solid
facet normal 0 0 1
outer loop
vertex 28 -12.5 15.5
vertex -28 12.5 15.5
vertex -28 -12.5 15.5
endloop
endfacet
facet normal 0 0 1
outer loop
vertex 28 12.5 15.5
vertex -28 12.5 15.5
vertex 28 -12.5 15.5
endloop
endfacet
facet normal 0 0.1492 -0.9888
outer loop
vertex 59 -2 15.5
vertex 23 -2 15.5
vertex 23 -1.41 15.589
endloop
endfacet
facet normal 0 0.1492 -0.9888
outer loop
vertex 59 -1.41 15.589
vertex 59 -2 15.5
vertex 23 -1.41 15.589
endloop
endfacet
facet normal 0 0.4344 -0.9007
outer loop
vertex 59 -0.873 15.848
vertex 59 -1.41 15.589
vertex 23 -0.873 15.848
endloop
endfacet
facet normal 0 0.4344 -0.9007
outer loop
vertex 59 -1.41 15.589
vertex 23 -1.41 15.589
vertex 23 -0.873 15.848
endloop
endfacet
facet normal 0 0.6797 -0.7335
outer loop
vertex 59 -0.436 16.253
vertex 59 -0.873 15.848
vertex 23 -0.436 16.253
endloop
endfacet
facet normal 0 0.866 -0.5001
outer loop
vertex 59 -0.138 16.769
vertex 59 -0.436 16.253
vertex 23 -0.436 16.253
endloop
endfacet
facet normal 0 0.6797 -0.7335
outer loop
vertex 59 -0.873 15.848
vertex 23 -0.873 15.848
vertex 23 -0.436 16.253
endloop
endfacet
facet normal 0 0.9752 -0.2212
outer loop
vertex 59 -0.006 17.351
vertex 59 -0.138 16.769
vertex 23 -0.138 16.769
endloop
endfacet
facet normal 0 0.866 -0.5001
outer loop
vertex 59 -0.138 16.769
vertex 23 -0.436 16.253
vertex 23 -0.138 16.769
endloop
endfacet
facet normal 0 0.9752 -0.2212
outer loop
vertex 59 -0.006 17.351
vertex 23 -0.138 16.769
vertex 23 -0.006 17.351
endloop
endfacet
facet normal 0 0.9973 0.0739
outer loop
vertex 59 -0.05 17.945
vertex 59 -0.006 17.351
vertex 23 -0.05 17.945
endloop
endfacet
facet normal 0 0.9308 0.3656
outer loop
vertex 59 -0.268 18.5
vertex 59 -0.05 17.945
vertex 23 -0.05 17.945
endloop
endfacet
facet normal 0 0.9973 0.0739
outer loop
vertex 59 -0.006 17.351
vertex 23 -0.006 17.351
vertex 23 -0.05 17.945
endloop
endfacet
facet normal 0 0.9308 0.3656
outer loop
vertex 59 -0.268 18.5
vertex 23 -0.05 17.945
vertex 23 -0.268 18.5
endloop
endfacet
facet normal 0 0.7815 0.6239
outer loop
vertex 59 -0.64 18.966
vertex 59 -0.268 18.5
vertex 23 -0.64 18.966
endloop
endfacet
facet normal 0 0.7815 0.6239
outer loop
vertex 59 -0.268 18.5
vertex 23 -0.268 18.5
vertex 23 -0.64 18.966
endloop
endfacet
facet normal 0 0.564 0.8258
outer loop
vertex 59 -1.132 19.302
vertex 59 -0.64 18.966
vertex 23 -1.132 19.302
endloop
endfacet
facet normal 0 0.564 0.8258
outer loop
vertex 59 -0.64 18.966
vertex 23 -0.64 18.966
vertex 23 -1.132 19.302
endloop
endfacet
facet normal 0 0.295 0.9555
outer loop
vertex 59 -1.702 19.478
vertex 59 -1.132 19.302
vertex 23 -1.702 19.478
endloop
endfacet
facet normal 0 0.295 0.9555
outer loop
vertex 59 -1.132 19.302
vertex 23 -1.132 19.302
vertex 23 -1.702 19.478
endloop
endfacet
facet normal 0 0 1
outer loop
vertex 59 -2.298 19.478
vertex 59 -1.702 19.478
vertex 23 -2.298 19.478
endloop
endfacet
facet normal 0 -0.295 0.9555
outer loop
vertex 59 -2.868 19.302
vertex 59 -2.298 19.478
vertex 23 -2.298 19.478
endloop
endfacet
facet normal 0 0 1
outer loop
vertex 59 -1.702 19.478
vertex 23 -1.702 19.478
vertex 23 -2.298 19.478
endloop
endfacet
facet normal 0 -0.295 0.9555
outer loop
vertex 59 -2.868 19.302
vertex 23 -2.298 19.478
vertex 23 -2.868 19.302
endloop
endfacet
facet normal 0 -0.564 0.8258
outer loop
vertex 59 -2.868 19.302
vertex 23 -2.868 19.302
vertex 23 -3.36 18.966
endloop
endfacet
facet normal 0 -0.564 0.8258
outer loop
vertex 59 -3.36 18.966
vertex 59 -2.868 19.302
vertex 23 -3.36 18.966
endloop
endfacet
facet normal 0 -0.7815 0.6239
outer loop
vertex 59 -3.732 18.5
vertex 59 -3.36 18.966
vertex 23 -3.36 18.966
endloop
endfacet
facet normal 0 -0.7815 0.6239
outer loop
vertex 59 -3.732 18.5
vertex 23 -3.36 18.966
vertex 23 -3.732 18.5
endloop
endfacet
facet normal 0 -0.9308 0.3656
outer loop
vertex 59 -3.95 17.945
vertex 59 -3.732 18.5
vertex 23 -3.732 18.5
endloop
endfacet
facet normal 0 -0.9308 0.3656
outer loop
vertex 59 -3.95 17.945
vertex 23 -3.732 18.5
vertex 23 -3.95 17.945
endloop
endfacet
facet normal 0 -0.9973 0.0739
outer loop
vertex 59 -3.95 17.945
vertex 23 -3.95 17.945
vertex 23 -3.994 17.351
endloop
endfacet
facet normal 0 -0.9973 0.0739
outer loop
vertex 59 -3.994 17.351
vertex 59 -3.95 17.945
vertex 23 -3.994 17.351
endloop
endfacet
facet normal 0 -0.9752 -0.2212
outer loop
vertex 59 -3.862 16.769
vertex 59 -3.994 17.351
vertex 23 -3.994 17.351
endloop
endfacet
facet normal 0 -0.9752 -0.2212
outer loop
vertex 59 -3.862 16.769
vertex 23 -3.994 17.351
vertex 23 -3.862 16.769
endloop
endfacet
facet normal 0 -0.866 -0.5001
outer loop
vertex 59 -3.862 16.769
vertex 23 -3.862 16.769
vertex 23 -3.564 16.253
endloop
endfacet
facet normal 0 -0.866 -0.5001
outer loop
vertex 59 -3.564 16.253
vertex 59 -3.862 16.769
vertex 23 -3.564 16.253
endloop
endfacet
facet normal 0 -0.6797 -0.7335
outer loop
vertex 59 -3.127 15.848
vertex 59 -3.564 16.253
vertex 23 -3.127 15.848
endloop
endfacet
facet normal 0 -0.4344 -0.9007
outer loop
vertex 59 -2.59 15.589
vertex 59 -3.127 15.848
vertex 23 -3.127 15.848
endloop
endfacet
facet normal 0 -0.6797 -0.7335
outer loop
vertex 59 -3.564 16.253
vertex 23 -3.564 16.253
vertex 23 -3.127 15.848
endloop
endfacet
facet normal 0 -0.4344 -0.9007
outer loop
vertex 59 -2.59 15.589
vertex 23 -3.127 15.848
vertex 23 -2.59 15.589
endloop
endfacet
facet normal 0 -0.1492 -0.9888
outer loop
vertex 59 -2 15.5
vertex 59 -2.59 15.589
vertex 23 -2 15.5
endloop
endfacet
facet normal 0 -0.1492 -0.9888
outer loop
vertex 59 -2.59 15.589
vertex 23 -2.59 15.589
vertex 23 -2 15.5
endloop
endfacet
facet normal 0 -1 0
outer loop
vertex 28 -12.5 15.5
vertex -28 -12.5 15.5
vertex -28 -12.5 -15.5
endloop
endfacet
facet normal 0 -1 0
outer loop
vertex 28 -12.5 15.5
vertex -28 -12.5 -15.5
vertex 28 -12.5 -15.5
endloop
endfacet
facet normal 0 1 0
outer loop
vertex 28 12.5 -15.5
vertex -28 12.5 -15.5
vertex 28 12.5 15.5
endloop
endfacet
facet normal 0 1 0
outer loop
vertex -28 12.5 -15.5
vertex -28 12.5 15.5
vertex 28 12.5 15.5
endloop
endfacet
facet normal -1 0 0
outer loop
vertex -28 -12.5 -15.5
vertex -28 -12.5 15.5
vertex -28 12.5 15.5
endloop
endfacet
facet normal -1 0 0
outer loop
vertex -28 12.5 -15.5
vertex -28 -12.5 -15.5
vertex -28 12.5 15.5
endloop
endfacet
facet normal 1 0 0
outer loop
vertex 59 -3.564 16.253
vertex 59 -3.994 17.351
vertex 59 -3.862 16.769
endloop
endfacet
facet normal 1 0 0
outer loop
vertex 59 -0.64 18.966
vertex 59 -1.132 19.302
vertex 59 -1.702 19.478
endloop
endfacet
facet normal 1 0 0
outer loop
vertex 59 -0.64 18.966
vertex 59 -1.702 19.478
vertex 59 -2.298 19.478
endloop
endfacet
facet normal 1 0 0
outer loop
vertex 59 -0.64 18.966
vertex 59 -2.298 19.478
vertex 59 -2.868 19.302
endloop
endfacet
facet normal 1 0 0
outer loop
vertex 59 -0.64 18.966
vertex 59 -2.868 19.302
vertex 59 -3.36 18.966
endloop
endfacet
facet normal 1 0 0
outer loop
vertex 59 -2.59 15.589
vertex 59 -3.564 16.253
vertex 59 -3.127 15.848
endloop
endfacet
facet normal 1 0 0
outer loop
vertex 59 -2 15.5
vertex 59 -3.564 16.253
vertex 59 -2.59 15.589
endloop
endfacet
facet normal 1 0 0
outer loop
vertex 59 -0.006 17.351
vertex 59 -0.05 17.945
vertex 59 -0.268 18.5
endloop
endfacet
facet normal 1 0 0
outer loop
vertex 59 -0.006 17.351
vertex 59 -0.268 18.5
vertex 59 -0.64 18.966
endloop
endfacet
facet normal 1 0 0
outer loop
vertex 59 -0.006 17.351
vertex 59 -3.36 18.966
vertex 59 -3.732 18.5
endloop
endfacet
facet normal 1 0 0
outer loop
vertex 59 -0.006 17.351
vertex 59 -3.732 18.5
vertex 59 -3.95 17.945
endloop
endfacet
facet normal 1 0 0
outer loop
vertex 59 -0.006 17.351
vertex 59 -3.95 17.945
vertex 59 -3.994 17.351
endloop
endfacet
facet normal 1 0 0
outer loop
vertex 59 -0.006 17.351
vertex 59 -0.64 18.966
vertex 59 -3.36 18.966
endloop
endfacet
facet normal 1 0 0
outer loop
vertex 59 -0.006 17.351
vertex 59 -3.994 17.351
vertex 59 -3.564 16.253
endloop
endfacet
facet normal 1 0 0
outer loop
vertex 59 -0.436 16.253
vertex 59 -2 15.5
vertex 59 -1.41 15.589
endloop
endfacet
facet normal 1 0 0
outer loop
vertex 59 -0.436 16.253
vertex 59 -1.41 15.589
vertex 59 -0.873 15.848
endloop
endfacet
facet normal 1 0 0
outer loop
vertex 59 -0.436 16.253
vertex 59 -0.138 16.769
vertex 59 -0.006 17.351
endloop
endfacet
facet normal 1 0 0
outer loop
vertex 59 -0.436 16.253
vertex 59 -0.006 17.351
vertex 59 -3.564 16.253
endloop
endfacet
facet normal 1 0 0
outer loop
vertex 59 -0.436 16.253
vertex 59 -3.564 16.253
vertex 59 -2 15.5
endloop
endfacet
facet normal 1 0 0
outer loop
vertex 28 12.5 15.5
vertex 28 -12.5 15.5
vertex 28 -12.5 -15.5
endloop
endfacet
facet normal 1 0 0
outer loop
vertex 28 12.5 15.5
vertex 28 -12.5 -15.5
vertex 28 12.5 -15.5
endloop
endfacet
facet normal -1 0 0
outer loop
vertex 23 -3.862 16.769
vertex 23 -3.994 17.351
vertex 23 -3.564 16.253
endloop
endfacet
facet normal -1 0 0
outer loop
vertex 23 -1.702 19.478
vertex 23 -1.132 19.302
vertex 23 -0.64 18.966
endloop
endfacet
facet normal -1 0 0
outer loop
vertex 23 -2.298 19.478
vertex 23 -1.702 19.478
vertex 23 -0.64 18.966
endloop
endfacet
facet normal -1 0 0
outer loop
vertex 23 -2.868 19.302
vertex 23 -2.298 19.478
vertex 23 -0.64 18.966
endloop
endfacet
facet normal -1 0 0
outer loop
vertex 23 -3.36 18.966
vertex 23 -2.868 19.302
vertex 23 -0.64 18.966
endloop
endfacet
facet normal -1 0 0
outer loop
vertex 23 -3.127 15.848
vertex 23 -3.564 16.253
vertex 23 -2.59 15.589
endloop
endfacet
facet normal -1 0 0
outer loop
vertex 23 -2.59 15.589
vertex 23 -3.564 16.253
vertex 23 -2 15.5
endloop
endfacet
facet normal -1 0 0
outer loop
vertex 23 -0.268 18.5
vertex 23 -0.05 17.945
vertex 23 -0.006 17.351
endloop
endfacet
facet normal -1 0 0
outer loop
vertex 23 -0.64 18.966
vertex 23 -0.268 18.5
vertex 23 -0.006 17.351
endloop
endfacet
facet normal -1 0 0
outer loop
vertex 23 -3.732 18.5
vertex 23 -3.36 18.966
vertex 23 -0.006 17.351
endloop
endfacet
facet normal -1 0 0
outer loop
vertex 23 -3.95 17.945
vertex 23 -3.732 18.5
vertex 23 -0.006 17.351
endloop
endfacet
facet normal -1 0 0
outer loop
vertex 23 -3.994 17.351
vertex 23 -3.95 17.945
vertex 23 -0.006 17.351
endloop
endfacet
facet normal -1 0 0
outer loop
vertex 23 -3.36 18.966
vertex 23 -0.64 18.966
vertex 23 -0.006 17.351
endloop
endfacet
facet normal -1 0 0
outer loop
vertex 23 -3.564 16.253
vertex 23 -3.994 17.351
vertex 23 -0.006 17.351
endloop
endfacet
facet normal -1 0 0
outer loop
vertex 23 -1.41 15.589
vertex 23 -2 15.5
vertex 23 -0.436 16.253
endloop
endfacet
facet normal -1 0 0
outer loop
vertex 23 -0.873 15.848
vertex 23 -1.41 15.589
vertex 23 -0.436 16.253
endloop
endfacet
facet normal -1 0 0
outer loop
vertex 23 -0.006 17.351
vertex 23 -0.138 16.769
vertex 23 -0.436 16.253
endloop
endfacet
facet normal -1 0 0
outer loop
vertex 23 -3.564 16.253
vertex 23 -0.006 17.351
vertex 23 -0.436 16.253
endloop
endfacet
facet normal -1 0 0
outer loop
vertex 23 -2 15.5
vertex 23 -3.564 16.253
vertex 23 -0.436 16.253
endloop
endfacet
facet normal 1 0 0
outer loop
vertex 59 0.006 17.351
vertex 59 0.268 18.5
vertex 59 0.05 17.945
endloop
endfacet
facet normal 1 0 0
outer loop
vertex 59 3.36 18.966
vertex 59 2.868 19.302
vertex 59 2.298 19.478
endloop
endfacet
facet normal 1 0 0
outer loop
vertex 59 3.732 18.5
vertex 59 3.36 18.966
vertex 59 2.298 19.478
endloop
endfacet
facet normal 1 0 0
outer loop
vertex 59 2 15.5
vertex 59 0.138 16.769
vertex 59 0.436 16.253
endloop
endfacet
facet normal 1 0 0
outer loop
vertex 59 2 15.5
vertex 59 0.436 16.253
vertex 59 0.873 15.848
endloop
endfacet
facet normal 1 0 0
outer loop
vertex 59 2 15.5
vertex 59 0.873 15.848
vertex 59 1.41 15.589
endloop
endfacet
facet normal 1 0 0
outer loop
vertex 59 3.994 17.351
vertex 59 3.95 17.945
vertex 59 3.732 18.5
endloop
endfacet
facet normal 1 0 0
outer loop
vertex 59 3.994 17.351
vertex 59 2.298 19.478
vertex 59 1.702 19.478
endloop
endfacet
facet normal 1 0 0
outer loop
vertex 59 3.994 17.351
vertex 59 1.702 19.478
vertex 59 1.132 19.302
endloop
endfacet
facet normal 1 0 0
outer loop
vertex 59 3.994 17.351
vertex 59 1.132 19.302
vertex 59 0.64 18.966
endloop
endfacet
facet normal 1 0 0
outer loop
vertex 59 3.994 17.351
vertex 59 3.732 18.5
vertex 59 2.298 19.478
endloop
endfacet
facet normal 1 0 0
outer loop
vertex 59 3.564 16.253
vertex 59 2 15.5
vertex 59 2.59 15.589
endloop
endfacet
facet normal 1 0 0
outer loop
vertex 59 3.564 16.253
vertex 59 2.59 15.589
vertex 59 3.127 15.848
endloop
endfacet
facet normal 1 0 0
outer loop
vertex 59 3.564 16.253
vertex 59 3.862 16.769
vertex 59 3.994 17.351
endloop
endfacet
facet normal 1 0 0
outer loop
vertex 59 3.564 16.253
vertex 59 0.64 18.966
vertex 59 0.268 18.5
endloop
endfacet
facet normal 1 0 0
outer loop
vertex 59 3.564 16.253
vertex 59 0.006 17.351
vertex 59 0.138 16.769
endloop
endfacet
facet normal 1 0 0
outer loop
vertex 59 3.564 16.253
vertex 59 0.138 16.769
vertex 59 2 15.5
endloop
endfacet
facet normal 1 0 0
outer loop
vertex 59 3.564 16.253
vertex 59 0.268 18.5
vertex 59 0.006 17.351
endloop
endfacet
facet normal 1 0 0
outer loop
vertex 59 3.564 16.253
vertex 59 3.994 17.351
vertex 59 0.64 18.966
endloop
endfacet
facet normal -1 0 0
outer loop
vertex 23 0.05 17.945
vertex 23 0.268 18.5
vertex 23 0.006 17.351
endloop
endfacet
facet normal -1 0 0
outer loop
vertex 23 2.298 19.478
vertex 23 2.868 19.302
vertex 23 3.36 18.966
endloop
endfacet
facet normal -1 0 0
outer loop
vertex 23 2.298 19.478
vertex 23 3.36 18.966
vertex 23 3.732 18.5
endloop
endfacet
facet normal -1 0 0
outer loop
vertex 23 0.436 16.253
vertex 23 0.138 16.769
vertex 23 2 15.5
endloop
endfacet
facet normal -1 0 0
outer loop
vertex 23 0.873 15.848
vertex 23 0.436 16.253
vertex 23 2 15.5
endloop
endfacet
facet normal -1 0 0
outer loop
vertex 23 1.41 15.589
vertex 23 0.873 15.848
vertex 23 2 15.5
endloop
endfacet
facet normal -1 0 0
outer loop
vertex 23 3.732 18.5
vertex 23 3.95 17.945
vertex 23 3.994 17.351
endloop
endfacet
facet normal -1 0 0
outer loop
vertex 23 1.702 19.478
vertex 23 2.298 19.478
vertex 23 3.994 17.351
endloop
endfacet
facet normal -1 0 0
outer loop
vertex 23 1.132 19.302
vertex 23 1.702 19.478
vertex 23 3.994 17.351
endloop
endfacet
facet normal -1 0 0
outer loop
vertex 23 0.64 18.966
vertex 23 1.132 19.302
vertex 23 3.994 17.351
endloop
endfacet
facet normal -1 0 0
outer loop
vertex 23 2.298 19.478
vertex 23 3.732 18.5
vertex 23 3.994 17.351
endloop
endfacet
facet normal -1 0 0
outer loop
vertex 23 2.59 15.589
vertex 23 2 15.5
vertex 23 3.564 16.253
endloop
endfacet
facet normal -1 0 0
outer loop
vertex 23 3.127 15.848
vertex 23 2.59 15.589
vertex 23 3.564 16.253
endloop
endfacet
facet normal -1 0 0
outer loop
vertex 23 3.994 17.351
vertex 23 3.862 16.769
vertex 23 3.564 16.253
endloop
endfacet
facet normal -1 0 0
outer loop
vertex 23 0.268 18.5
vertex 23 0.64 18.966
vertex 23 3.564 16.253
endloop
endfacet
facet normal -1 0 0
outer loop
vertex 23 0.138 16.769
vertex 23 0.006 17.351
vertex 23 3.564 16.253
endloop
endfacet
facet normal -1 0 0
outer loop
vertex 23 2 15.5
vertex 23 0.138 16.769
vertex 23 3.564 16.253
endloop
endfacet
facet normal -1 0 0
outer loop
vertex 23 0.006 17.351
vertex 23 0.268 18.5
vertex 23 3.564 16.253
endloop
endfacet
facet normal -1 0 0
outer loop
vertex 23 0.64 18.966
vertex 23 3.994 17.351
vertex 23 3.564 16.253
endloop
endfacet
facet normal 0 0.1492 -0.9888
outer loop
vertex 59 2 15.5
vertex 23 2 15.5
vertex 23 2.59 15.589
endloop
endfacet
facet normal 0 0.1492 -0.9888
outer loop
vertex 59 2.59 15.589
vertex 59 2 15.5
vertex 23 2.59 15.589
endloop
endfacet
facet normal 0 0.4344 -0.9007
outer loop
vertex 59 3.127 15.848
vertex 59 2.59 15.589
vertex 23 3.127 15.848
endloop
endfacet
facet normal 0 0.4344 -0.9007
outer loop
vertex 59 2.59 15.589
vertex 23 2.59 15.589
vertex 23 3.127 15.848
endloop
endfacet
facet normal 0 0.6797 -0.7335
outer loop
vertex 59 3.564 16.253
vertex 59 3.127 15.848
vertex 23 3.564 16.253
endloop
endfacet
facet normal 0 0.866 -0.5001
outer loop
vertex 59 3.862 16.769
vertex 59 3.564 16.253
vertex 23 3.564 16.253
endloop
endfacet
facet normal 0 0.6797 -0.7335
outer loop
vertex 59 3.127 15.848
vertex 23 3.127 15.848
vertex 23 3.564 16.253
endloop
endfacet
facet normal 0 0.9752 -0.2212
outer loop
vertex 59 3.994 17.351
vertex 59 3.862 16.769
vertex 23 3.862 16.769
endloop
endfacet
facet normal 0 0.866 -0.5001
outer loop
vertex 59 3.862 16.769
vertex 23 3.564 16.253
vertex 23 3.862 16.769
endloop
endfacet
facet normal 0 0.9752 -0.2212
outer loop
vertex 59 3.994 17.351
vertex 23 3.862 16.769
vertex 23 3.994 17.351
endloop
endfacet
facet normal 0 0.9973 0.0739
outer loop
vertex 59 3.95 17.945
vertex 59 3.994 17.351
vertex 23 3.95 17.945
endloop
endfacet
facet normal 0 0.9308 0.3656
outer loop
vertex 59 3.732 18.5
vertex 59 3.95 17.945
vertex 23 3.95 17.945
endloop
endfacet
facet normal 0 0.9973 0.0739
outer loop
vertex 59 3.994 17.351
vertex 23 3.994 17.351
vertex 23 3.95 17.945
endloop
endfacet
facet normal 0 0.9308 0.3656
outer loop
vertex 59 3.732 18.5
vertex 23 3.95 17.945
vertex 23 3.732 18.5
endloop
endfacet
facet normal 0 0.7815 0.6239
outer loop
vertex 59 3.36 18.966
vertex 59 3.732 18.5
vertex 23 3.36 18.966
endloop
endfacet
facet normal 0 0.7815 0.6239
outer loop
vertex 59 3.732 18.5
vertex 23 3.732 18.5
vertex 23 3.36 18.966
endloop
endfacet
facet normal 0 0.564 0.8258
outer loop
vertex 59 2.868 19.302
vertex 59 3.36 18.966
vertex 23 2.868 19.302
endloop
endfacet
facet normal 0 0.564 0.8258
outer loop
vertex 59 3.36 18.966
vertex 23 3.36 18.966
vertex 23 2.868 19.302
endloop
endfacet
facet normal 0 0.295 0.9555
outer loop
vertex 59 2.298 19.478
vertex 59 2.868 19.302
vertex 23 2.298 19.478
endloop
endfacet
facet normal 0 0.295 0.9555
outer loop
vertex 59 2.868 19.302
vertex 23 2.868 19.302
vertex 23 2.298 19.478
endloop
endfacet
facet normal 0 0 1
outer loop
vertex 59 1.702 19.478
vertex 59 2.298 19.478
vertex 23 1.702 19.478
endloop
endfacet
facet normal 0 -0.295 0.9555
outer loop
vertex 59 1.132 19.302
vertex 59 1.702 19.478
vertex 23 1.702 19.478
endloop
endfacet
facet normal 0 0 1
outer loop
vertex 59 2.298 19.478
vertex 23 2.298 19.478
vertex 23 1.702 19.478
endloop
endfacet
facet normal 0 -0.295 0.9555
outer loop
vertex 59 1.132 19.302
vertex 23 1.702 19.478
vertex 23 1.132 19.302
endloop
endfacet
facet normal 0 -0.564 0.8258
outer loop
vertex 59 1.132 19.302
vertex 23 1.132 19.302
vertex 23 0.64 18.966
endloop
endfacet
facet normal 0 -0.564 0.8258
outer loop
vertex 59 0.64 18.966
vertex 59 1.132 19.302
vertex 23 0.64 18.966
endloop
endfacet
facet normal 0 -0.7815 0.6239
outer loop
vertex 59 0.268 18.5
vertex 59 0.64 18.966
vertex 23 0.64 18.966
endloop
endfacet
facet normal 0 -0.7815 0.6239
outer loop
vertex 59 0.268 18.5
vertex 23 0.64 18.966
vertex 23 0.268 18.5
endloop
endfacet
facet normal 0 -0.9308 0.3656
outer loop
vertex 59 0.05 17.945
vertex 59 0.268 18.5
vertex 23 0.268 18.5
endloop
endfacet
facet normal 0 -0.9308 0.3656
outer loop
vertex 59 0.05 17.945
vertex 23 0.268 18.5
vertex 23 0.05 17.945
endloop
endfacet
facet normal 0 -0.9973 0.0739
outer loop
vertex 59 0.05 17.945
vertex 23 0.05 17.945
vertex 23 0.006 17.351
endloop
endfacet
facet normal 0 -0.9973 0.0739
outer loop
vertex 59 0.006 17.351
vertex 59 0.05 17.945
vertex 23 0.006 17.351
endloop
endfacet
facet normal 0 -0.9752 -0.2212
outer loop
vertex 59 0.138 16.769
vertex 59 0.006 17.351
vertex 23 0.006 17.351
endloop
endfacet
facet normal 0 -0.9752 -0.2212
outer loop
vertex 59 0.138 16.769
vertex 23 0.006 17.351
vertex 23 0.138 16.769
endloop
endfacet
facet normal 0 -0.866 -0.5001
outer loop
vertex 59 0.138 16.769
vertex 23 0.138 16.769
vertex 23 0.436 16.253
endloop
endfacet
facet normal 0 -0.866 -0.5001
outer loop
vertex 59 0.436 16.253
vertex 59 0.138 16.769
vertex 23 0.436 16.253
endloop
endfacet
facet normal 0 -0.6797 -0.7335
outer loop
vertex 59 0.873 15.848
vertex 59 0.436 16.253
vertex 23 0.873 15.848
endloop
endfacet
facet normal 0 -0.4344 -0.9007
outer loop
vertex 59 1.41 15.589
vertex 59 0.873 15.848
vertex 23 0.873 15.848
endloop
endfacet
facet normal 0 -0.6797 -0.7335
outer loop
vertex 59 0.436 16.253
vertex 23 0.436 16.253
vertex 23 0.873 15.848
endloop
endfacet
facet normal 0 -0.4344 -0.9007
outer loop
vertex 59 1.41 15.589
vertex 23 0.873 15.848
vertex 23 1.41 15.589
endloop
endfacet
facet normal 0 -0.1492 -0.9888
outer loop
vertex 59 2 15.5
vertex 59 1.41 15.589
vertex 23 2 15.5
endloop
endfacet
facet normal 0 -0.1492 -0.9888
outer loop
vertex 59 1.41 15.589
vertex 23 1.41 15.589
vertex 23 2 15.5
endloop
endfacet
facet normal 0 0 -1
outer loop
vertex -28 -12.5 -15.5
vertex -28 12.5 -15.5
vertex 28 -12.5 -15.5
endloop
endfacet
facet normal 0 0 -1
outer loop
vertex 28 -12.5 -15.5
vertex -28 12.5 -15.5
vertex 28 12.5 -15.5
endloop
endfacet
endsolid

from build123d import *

# Parameters (mm, degrees)
SKETCH1_W                  = 56
SKETCH1_H                  = 25
BOSS_EXTRUDE1_DEPTH        = 15.5
BOSS_EXTRUDE2_DEPTH        = 31
BOSS_EXTRUDE2_DEPTH_BACK   = 5
SKETCH2_R                  = 2
BOSS_EXTRUDE2_2_DEPTH      = 31
BOSS_EXTRUDE2_2_DEPTH_BACK = 5


with BuildPart() as part:
    # Sketch1 → Boss-Extrude1 (new, symmetric)
    with BuildSketch(Plane.XY):
        Rectangle(SKETCH1_W, SKETCH1_H)
    extrude(amount=BOSS_EXTRUDE1_DEPTH, both=True)


with BuildPart() as body_2:
    # Sketch2 → Boss-Extrude2 (new, two sides: drawn at the far end of the back side and taken through both)
    with BuildSketch(Plane(origin=(28, 0, 0), x_dir=(0, 0, -1), z_dir=(1, 0, 0)).offset(-BOSS_EXTRUDE2_DEPTH_BACK)):
        with Locations((-17.5, 2)):
            Circle(SKETCH2_R)
    extrude(amount=BOSS_EXTRUDE2_DEPTH + BOSS_EXTRUDE2_DEPTH_BACK)


with BuildPart() as body_3:
    # Sketch2 → Boss-Extrude2 2 (new, two sides: drawn at the far end of the back side and taken through both)
    with BuildSketch(Plane(origin=(28, 0, 0), x_dir=(0, 0, -1), z_dir=(1, 0, 0)).offset(-BOSS_EXTRUDE2_2_DEPTH_BACK)):
        with Locations((-17.5, -2)):
            Circle(SKETCH2_R)
    extrude(amount=BOSS_EXTRUDE2_2_DEPTH + BOSS_EXTRUDE2_2_DEPTH_BACK)


solid = Compound([part.part, body_2.part, body_3.part])
